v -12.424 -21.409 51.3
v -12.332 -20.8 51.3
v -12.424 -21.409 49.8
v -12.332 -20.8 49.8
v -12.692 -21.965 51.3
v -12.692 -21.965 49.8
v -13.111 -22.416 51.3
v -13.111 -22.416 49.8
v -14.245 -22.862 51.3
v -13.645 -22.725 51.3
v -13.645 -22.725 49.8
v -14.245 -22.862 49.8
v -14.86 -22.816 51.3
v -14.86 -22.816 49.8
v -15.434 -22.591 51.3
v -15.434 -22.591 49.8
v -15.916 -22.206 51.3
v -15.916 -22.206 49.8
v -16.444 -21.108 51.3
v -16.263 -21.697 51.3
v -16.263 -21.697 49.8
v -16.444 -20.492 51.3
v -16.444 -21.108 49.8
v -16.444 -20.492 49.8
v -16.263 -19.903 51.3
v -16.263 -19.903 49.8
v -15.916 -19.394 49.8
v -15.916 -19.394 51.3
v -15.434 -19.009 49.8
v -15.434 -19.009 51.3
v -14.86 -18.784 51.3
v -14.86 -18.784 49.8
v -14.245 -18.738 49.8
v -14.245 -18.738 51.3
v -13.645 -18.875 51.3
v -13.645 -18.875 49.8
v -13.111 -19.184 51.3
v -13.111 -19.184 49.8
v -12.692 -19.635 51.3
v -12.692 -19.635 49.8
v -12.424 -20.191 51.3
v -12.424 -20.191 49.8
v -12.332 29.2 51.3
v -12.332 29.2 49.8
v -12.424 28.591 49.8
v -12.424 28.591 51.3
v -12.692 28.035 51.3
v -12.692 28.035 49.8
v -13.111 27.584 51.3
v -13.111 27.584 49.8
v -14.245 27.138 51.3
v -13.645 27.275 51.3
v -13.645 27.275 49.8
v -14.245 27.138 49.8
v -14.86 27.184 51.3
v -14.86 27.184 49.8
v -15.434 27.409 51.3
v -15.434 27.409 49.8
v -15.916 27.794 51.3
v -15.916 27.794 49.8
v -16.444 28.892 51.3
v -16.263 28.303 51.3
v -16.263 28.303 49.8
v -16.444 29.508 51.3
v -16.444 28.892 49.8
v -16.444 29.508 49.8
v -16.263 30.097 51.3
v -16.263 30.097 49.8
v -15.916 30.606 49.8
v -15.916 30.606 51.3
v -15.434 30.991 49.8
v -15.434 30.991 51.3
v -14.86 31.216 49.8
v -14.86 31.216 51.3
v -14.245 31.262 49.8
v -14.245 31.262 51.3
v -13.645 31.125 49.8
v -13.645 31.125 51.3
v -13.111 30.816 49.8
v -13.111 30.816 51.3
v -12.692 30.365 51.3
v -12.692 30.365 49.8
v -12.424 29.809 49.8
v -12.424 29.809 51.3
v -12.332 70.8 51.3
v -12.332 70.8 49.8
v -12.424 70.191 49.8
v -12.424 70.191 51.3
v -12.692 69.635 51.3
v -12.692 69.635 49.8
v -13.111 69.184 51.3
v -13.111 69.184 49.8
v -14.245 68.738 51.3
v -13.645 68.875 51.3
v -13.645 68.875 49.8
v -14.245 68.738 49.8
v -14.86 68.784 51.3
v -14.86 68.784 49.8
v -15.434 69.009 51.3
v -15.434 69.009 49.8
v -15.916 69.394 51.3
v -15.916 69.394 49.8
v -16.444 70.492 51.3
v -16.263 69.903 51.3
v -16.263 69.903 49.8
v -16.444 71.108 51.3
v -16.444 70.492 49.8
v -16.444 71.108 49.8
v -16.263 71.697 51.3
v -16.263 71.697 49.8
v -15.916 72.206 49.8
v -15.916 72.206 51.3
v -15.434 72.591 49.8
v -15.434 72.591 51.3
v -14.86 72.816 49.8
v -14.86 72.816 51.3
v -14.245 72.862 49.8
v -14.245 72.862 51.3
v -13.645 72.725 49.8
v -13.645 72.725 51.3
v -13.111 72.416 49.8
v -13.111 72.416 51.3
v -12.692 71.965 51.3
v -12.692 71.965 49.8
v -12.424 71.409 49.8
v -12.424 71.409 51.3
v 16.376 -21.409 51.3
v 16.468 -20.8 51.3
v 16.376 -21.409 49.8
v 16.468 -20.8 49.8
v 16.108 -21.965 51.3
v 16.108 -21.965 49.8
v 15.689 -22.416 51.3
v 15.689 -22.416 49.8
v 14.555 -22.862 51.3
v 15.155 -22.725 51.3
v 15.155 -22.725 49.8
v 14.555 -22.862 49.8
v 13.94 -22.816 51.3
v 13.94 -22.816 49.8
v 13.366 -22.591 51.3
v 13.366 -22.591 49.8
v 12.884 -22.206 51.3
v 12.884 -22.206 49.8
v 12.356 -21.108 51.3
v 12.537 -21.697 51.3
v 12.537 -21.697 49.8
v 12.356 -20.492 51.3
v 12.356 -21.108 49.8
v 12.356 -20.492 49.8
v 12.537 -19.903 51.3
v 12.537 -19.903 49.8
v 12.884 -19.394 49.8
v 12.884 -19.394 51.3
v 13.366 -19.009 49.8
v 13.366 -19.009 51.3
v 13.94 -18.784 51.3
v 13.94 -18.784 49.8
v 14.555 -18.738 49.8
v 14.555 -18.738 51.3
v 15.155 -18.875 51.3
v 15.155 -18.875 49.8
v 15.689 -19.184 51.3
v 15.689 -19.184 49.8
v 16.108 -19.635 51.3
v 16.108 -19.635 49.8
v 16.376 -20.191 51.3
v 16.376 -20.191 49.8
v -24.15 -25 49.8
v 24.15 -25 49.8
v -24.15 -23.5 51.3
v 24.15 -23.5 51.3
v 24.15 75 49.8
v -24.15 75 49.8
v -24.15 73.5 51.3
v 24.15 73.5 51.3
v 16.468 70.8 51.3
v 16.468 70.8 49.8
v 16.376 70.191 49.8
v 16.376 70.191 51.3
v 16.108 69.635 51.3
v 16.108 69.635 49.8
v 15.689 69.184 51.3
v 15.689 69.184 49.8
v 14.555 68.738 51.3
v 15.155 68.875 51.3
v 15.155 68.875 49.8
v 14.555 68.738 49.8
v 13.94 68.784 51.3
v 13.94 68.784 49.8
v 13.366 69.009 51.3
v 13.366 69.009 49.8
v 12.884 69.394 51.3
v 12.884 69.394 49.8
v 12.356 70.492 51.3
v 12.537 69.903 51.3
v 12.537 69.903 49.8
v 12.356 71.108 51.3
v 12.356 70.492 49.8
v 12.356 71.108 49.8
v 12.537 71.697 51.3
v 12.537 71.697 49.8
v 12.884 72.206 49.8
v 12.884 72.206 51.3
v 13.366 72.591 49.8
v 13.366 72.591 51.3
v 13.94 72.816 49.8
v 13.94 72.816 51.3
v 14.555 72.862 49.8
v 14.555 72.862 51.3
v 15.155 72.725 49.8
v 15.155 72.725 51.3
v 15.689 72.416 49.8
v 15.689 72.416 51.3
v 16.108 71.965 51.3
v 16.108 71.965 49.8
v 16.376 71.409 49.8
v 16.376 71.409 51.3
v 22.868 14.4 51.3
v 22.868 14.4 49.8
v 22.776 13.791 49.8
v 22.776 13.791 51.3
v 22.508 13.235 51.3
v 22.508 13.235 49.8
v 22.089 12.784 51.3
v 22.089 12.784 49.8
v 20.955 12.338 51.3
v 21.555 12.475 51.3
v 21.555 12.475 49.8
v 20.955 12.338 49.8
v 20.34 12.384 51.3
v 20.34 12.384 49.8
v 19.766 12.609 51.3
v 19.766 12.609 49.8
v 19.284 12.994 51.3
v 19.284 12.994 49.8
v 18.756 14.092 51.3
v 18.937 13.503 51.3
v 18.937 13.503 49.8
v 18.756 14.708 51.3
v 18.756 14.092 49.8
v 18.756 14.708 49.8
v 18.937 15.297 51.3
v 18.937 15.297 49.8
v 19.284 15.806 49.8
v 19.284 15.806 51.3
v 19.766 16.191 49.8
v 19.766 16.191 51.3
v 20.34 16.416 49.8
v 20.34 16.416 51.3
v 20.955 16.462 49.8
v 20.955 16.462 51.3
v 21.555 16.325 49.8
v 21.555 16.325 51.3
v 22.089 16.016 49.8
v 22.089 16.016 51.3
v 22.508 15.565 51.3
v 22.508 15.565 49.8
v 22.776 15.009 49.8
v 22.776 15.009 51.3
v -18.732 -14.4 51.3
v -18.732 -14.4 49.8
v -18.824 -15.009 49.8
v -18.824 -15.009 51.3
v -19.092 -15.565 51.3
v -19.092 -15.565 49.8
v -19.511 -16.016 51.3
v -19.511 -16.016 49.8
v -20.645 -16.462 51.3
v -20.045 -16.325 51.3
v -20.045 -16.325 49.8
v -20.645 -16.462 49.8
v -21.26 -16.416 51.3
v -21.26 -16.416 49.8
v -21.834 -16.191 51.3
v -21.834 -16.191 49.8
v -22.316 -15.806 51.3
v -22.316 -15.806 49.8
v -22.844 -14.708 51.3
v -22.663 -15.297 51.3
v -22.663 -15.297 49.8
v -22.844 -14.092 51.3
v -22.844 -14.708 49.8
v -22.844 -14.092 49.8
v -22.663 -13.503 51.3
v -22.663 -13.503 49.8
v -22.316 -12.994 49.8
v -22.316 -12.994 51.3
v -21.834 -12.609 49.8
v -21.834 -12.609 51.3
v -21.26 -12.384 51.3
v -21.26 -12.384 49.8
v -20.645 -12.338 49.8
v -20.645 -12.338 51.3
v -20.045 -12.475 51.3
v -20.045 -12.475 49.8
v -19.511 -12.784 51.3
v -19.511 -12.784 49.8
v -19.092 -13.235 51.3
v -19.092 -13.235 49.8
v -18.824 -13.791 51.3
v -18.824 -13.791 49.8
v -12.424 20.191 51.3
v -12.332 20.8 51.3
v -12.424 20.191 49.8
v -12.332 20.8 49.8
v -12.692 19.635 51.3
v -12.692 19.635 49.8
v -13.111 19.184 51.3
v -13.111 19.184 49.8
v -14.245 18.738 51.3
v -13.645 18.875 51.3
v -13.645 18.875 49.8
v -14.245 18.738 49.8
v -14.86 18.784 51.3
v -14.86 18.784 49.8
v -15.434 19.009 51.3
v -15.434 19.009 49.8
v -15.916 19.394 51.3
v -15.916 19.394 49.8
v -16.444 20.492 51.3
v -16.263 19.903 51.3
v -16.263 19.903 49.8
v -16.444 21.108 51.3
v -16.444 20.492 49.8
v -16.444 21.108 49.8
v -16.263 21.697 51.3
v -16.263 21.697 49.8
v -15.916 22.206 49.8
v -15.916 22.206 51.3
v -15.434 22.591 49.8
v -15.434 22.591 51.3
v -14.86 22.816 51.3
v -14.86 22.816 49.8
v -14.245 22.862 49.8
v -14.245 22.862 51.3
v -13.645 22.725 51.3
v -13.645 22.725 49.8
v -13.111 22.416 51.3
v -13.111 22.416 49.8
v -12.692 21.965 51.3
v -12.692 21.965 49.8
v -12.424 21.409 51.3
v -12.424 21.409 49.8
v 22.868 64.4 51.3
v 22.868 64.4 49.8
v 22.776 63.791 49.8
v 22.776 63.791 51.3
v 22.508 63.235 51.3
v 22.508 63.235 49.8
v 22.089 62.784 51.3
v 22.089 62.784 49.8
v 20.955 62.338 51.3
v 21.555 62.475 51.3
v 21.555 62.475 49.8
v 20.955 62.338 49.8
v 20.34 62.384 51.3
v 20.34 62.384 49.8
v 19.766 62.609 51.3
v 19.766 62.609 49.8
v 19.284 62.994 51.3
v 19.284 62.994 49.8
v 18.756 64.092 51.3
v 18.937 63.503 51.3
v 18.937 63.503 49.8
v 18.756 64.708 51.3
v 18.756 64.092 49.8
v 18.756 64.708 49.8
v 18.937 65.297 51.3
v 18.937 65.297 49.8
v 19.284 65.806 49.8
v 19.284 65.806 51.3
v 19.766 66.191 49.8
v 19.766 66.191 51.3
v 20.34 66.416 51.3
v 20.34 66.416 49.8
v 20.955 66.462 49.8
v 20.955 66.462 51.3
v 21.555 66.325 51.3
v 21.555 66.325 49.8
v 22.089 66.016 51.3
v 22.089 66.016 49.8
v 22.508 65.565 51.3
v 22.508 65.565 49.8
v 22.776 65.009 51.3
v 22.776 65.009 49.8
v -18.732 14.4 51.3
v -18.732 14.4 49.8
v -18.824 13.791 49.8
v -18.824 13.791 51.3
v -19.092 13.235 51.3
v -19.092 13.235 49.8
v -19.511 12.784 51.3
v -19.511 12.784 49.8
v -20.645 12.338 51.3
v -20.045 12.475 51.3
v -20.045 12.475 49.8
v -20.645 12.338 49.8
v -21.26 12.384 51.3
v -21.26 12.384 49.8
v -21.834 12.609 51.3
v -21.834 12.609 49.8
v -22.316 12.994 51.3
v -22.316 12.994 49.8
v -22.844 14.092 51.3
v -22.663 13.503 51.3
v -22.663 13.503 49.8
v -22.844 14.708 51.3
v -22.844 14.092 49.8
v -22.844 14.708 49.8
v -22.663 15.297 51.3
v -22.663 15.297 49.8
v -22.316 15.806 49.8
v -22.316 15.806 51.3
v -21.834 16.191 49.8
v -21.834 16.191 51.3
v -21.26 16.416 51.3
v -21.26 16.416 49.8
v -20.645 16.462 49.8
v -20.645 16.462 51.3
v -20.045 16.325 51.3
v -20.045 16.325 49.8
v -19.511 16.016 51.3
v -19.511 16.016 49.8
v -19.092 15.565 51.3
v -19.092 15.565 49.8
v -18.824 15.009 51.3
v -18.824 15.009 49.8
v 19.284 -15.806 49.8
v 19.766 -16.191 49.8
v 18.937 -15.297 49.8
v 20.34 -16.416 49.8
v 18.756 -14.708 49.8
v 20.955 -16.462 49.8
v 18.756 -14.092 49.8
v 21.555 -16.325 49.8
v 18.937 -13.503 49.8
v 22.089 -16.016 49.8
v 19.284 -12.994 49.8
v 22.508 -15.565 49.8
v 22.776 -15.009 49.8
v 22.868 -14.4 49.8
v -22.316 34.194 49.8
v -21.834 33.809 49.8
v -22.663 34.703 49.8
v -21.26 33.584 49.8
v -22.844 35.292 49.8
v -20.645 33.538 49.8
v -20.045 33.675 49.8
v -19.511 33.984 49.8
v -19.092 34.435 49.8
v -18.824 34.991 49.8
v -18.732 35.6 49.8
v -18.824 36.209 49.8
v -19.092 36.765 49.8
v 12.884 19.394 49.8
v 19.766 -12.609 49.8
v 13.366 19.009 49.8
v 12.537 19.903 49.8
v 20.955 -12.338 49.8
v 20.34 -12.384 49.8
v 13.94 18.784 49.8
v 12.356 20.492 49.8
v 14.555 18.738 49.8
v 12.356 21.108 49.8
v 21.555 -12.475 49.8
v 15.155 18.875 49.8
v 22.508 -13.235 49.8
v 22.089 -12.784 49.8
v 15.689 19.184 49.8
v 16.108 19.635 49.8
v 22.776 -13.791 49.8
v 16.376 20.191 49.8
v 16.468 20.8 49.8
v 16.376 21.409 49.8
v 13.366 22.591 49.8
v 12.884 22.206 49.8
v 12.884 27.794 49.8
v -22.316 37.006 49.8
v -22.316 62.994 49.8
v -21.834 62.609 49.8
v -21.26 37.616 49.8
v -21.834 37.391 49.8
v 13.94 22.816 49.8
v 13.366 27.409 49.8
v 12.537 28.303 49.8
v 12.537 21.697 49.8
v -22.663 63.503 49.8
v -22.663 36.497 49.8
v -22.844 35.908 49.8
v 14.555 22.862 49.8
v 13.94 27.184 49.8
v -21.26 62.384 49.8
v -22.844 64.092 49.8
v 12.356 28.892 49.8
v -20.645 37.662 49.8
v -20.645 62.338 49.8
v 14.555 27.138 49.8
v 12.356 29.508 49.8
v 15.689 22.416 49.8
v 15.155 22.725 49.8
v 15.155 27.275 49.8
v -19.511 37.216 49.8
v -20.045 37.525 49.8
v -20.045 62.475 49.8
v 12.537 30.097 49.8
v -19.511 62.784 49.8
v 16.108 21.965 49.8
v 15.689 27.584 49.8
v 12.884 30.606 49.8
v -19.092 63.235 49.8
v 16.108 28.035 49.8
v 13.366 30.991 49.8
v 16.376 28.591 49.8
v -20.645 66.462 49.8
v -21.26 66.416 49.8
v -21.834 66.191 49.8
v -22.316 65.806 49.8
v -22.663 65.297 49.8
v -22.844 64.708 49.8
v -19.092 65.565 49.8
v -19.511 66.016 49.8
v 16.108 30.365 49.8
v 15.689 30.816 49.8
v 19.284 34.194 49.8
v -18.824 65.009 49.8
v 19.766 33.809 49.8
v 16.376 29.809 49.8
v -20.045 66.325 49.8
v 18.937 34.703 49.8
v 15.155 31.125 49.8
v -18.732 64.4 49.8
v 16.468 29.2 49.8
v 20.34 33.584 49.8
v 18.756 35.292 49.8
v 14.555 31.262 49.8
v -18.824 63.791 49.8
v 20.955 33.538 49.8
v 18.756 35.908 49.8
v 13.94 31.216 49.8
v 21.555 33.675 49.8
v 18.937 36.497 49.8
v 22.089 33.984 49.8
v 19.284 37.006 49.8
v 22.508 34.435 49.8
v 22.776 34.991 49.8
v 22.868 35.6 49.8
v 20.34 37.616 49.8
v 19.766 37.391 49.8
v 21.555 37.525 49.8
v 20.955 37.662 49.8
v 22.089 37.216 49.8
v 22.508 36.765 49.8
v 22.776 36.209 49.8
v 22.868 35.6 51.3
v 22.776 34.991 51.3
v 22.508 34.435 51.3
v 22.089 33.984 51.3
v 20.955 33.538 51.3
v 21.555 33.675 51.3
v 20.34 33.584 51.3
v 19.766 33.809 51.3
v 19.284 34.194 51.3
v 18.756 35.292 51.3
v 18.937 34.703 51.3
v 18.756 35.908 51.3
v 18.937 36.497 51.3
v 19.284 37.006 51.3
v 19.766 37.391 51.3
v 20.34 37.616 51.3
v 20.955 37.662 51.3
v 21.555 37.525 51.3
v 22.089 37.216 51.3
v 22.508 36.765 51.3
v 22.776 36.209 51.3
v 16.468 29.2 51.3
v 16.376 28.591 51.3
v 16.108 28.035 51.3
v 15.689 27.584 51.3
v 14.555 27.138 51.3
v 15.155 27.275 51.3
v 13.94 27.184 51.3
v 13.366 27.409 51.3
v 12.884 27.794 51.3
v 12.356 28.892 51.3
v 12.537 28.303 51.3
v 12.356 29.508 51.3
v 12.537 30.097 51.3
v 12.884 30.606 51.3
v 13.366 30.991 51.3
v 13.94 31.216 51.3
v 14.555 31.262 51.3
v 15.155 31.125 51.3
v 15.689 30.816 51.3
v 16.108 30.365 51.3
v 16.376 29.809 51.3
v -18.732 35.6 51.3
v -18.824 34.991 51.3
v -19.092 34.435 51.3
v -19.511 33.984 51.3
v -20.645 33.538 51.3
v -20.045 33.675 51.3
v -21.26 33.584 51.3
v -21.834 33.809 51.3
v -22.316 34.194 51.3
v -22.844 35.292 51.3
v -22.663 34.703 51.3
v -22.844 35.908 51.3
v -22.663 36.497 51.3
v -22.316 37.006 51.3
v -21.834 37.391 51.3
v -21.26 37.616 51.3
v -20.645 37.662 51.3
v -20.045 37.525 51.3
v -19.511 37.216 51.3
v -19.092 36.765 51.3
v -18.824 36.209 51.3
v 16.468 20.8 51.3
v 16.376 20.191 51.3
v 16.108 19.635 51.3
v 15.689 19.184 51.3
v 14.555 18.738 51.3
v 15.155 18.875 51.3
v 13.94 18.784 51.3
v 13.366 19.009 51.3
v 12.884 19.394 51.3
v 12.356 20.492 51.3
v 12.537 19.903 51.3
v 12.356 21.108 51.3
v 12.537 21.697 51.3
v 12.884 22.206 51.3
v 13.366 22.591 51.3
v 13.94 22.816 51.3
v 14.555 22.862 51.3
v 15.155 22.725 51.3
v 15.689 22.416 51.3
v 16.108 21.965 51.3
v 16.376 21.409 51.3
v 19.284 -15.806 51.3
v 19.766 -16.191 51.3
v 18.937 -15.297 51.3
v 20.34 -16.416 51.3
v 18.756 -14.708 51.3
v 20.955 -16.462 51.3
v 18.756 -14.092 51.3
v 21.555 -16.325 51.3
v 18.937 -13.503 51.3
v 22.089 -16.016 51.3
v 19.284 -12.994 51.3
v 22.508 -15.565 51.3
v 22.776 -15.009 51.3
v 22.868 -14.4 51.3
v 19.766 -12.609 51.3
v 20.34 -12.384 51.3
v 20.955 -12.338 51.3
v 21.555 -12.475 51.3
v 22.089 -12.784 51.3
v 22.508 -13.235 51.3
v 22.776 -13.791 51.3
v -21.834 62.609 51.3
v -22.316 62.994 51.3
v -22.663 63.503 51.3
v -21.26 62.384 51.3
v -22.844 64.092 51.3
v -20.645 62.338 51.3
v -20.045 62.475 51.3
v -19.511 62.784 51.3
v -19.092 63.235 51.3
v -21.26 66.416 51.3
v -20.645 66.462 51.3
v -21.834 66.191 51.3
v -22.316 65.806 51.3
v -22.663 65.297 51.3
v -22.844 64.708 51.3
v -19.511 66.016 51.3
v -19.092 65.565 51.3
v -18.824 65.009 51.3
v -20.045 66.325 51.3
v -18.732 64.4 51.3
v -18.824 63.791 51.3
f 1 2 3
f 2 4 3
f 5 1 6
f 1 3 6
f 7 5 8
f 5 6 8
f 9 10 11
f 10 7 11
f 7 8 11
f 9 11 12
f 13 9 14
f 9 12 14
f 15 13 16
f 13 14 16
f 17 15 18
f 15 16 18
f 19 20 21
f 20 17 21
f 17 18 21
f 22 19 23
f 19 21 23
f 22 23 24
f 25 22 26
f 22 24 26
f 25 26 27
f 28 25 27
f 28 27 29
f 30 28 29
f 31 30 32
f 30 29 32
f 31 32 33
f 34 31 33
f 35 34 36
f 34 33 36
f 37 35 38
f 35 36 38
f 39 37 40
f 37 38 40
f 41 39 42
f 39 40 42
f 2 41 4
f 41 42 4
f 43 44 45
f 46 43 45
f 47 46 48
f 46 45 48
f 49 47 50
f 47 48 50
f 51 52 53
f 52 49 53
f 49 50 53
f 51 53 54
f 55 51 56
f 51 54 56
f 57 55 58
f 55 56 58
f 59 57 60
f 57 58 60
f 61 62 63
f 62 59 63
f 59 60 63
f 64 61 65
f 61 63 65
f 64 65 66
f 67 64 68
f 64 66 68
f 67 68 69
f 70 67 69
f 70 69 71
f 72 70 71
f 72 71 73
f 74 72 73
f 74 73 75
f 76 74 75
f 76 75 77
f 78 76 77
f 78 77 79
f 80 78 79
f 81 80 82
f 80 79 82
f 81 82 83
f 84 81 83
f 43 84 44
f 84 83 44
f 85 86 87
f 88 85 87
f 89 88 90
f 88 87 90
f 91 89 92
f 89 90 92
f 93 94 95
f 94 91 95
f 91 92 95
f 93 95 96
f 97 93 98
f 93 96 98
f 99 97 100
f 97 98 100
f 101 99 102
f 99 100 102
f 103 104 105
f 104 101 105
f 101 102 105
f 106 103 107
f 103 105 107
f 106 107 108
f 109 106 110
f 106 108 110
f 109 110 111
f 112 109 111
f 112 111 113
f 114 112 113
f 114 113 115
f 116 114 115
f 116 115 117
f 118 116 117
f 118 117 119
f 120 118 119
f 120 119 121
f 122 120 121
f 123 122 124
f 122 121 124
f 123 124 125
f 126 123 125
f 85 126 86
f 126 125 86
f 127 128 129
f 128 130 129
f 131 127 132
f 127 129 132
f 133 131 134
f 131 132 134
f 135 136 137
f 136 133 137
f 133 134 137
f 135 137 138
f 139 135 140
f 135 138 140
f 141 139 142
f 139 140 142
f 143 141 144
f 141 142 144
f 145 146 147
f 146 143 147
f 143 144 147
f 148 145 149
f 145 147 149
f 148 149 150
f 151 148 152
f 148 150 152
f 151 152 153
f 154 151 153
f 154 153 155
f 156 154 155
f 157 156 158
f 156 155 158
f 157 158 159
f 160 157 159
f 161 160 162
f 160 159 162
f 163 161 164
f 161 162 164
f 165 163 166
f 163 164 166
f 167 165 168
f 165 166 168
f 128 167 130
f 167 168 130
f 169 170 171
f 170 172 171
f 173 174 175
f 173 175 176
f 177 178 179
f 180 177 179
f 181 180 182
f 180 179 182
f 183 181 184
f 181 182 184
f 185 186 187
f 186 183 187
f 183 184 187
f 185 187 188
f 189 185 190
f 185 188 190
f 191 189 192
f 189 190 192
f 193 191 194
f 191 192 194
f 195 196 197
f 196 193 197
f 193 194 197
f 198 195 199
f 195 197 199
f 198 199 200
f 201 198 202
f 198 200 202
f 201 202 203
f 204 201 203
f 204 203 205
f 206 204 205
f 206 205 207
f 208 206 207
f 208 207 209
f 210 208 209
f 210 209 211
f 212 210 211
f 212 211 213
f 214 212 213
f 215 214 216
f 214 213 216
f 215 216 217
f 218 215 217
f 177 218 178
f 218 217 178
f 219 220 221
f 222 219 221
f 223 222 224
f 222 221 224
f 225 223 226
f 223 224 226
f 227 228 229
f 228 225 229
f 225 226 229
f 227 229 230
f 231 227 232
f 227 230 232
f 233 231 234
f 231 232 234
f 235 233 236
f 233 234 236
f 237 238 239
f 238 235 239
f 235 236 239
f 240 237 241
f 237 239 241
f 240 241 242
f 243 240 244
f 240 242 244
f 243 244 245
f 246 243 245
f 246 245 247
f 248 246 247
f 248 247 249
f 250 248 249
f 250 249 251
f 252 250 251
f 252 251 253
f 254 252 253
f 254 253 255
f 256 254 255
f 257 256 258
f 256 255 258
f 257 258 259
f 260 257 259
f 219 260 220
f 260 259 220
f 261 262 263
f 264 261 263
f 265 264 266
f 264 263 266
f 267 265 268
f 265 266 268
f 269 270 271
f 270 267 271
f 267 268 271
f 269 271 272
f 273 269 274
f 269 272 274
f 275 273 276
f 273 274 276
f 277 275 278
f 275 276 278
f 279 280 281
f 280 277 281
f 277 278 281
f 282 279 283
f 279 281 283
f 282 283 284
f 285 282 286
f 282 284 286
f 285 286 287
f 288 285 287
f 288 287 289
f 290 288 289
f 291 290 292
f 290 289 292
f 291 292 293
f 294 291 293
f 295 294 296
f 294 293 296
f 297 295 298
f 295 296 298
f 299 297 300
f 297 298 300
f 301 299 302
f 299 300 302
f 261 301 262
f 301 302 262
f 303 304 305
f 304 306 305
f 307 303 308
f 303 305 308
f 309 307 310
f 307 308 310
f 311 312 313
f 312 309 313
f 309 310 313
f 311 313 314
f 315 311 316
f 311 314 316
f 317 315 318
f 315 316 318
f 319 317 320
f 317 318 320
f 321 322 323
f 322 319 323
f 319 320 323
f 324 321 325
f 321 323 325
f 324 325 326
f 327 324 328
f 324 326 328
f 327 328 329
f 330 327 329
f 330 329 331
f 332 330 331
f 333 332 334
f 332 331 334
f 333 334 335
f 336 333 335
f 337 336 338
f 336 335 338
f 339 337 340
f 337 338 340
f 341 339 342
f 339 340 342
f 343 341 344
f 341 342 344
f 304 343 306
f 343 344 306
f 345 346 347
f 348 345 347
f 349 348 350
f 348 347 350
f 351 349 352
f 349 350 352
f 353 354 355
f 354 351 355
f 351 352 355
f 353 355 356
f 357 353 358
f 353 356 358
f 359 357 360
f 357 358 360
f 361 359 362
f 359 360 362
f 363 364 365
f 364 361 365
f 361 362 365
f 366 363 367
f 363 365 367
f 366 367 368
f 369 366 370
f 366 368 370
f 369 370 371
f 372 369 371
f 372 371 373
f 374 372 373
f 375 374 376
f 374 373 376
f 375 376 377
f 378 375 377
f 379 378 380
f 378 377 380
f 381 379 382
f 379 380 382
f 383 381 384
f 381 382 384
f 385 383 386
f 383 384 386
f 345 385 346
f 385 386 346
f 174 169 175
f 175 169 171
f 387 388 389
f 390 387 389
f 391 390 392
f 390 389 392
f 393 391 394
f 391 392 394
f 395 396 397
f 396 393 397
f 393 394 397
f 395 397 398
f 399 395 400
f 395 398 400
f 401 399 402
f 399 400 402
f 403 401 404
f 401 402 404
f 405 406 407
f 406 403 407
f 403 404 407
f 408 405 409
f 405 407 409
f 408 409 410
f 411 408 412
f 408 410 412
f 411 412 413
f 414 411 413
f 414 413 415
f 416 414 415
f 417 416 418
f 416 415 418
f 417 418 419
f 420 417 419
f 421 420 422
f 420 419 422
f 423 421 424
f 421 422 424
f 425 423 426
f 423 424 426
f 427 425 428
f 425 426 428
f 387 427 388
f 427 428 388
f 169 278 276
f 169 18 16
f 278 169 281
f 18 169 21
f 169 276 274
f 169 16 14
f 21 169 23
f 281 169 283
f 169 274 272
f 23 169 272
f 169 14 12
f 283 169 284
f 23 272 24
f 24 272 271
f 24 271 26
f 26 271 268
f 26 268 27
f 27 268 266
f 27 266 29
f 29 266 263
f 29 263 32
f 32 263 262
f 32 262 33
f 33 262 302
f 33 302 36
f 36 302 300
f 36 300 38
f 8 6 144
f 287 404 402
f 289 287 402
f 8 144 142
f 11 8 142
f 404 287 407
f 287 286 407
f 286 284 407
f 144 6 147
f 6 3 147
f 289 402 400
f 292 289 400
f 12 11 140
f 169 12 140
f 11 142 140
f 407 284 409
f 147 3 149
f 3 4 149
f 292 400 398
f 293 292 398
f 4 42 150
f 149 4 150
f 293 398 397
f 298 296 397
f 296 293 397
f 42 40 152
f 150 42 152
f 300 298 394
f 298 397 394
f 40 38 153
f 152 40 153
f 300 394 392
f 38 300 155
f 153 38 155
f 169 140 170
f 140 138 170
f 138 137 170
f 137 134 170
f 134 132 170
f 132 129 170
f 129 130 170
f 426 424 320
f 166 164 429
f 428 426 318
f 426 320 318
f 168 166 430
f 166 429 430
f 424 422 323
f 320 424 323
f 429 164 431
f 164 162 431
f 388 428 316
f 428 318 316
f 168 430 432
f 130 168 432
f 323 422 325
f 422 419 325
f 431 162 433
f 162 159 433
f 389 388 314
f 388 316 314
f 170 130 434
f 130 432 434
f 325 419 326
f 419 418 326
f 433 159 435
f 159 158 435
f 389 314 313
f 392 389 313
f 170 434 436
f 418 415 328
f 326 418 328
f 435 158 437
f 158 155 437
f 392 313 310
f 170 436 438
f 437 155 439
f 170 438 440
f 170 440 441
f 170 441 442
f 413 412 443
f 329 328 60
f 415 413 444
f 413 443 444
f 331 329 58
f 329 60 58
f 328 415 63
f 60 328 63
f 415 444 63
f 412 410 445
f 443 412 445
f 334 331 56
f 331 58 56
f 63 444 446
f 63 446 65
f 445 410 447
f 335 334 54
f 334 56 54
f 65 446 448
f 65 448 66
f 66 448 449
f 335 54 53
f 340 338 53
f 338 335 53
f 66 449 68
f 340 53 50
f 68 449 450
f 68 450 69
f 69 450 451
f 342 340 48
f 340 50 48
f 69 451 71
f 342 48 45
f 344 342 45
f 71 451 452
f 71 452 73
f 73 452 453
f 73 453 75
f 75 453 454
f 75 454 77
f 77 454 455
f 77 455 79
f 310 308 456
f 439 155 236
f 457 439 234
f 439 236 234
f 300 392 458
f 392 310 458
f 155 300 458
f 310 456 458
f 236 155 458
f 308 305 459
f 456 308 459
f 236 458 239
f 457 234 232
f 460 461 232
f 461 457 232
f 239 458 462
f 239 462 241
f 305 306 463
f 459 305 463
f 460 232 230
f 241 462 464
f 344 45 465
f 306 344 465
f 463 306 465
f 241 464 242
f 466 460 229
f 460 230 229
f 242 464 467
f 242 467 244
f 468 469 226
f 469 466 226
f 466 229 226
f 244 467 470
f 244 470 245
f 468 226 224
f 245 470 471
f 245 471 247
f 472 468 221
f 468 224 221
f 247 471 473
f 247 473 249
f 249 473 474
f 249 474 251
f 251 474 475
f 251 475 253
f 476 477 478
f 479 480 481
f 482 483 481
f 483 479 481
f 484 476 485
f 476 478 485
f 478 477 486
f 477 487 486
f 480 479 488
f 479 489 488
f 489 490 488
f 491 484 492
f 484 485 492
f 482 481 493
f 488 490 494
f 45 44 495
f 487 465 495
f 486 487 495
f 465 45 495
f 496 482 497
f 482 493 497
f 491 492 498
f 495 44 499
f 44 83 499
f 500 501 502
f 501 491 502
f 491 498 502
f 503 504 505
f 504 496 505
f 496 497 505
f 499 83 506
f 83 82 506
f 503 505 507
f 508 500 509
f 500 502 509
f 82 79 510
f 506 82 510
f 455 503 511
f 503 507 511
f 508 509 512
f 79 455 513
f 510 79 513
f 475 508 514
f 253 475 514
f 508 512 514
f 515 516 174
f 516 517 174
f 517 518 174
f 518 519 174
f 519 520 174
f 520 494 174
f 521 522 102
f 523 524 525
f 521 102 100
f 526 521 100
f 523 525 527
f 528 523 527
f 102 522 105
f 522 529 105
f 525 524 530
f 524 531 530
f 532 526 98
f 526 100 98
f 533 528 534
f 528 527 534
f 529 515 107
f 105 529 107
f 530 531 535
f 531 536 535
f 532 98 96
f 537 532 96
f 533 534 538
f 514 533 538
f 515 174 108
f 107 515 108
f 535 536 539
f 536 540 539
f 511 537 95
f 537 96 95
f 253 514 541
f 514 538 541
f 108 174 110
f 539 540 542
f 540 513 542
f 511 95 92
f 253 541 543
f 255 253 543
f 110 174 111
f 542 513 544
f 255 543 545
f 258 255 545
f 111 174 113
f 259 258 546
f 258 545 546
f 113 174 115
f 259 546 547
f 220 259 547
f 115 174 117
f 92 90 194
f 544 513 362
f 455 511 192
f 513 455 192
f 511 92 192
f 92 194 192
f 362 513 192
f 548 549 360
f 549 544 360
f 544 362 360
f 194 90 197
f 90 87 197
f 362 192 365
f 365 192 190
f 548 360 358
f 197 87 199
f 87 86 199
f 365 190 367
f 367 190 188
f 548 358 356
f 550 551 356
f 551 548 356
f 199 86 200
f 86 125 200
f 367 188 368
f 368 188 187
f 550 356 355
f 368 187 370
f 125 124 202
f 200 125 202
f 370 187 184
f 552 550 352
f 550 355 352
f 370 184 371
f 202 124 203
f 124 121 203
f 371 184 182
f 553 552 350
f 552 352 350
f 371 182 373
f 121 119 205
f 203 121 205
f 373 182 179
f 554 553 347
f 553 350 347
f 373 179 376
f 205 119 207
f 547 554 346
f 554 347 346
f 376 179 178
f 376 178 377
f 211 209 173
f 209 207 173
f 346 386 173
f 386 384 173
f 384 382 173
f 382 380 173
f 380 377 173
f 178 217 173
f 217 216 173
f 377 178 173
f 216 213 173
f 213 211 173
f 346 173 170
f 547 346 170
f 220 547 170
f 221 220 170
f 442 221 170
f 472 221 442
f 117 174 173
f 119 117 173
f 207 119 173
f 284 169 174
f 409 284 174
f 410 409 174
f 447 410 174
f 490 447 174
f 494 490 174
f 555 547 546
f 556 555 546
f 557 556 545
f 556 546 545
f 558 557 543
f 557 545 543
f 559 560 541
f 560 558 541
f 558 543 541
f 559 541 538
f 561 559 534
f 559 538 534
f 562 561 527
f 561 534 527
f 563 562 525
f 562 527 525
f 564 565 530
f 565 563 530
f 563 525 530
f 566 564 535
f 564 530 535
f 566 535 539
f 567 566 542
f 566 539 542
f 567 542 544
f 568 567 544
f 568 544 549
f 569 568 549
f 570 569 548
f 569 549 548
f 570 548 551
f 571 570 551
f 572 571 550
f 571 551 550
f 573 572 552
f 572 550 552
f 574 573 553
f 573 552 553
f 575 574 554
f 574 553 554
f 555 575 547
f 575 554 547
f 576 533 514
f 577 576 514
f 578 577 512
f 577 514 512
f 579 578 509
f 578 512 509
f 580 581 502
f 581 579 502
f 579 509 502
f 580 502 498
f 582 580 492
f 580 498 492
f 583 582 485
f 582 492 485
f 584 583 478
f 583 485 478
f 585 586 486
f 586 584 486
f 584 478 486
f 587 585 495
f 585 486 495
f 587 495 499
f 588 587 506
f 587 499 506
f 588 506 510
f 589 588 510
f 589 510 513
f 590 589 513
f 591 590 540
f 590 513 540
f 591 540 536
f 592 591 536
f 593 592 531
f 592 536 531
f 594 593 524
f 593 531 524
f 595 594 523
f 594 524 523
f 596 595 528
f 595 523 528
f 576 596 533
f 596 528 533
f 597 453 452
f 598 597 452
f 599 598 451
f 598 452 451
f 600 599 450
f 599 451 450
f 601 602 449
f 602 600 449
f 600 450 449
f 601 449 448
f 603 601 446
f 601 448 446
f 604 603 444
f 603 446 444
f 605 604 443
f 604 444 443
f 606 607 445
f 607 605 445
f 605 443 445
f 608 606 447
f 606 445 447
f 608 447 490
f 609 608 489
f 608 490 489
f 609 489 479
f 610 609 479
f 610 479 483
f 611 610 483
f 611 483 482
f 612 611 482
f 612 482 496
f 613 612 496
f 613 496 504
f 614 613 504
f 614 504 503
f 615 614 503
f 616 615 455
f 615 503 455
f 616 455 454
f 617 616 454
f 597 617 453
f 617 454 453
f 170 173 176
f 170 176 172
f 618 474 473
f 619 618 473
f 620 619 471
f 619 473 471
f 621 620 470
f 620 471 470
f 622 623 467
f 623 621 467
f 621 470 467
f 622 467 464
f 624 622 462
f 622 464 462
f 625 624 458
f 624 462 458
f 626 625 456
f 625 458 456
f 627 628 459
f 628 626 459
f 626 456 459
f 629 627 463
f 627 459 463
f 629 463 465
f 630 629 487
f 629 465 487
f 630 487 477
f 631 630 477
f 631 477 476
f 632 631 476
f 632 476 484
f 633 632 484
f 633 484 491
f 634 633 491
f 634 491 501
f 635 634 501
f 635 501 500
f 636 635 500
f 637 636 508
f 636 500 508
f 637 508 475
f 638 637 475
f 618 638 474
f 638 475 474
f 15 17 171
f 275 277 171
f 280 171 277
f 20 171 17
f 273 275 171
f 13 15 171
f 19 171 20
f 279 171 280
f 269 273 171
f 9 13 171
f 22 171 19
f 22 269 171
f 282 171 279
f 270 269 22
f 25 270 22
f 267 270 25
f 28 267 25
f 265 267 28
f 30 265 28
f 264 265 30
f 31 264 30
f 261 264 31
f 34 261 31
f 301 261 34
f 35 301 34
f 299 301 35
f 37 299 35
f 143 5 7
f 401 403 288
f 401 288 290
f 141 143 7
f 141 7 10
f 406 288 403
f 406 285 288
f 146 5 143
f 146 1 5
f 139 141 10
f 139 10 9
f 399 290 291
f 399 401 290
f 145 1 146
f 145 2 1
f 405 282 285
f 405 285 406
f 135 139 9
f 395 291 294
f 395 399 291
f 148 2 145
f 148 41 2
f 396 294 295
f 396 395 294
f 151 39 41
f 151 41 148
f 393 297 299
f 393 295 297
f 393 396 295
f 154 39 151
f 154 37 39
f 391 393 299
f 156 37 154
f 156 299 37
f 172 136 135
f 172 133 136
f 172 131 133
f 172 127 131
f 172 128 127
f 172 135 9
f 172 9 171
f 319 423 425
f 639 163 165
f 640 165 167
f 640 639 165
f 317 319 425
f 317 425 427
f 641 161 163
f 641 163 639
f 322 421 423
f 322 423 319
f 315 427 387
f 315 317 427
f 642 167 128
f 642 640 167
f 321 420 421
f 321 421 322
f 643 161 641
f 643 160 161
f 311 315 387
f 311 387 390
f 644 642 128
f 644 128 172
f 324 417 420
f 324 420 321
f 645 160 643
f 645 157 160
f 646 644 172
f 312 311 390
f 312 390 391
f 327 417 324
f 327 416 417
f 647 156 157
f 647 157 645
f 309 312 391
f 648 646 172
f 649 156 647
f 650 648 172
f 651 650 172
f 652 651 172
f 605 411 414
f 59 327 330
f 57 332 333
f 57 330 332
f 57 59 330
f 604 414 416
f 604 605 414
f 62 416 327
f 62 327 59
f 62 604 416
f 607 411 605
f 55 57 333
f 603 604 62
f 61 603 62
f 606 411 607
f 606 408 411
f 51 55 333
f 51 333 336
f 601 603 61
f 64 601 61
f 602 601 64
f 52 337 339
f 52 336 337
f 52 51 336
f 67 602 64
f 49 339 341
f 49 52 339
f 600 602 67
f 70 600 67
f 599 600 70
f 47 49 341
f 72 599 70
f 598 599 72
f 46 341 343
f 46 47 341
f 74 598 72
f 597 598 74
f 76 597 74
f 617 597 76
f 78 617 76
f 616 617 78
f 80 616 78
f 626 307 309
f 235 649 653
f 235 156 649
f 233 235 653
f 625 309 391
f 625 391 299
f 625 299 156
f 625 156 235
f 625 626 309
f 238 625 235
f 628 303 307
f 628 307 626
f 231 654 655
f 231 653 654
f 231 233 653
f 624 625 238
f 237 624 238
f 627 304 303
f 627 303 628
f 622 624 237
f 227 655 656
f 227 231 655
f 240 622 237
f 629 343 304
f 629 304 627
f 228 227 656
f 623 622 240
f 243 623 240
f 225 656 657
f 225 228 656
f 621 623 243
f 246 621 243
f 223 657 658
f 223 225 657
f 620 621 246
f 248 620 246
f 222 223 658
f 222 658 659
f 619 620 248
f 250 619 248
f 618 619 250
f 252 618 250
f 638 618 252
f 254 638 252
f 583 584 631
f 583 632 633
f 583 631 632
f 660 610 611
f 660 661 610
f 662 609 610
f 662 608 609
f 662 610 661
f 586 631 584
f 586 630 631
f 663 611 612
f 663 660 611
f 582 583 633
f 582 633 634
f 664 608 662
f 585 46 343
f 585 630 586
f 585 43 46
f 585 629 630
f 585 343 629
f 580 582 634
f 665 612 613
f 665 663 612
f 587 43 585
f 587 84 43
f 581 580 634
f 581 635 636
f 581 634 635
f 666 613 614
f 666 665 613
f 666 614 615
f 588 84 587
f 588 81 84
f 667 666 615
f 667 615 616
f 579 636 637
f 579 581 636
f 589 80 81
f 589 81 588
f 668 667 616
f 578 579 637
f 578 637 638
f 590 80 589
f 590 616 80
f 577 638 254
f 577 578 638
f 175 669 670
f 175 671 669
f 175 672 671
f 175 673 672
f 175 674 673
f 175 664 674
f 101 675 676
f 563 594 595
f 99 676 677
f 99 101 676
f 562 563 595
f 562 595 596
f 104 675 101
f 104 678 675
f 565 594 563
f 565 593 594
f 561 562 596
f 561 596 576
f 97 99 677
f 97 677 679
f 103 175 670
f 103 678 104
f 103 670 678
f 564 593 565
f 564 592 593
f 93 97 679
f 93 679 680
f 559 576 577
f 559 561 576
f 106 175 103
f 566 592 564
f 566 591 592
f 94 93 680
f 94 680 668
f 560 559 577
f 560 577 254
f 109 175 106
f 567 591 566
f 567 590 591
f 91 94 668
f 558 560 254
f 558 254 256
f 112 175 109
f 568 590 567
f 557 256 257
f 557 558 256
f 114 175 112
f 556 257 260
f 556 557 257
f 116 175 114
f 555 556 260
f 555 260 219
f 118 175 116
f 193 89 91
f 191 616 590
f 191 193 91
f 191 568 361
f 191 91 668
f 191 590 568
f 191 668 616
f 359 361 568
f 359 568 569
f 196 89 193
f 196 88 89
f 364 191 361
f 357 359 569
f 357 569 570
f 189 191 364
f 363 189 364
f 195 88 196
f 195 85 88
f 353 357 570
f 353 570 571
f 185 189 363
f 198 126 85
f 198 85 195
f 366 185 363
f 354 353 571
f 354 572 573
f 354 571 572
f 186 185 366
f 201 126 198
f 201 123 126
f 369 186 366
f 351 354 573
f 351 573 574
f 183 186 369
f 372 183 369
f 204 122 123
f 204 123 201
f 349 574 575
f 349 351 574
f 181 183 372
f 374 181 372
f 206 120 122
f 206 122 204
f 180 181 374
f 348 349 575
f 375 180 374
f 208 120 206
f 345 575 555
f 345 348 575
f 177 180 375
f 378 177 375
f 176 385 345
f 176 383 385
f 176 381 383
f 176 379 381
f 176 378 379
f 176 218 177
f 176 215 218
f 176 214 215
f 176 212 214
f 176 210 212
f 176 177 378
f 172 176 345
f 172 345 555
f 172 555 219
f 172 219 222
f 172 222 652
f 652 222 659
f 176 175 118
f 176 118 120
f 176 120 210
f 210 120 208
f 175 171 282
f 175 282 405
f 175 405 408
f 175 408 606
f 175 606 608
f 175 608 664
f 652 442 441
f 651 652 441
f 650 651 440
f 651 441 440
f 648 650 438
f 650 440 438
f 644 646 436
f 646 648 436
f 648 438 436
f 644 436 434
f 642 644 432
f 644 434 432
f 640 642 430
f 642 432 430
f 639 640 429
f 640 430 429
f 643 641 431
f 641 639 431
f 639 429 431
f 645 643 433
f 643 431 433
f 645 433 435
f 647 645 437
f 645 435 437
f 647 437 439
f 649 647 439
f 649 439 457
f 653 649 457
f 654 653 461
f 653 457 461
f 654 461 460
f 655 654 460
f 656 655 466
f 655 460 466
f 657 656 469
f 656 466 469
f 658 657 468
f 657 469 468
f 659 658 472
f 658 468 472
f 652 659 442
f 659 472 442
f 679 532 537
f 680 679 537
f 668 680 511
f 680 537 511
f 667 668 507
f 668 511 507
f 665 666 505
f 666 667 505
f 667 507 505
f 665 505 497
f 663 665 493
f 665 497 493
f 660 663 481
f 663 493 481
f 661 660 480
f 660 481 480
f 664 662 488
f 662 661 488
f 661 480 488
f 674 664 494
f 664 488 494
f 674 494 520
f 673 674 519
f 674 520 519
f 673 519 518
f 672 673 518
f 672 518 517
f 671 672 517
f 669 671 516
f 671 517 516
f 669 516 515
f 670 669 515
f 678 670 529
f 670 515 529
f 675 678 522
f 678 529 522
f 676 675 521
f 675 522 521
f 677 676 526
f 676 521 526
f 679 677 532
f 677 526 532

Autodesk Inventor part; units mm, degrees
ref_plane "YZ Plane" through (0, 0, 0) normal (1, 0, 0) x (0, 1, 0)
ref_plane "XZ Plane" through (0, 0, 0) normal (0, 1, 0) x (-1, 0, 0)
sketch "Sketch1" plane through (0, 0, 0) normal (0, 0, 1) x (1, 0, 0)
  circle A0 centre (-21.9, -21.9) radius 1.875 projected
  circle A1 centre (21.9, 21.9) radius 1.875 projected
  circle A2 centre (21.9, -21.9) radius 1.875 projected
  circle A3 centre (-21.9, 21.9) radius 1.875 projected
  circle A4 centre (14.4, 20.8) radius 2.0675 projected
  circle A5 centre (-14.4, -20.8) radius 2.0675 projected
  circle A6 centre (14.4, -20.8) radius 2.0675 projected
  circle A7 centre (20.8, -14.4) radius 2.0675 projected
  line L0 (-17.05, 17.05) -> (-17.05, -17.05) projected
  line L1 (17.05, 17.05) -> (-17.05, 17.05) projected
  line L2 (17.05, -17.05) -> (17.05, 17.05) projected
  line L3 (-17.05, -17.05) -> (17.05, -17.05) projected
  circle A8 centre (20.8, 14.4) radius 2.0675 projected
  circle A9 centre (-14.4, 20.8) radius 2.0675 projected
  circle A10 centre (-20.8, -14.4) radius 2.0675 projected
  circle A11 centre (-20.8, 14.4) radius 2.0675 projected
  line L4 (-22.9, 24.15) -> (22.9, 24.15) projected
  arc A12 (-22.9, 24.15) -> (-24.15, 22.9) centre (-22.9, 22.9) ccw projected
  line L5 (-24.15, -22.9) -> (-24.15, 22.9) projected
  arc A13 (-24.15, -22.9) -> (-22.9, -24.15) centre (-22.9, -22.9) ccw projected
  line L6 (22.9, -24.15) -> (-22.9, -24.15) projected
  arc A14 (22.9, -24.15) -> (24.15, -22.9) centre (22.9, -22.9) ccw projected
  line L7 (24.15, 22.9) -> (24.15, -22.9) projected
  arc A15 (24.15, 22.9) -> (22.9, 24.15) centre (22.9, 22.9) ccw projected
  point P0 (0, 0)
ref_plane "Work Plane1" through (-24.15, -24.15, 49.8) normal (0, 0, 1) x (1, 0, 0)
extrude "Extrusion1" add sketch "Sketch1" along normal blind 1.5 from surface at 49.8 contours A0 | A1 | A2 | A3 | L1 L2 L3 L0 | L4 A15 L7 A14 L6 A13 L5 A12
sketch "Sketch2" plane through (-22.9, -24.15, 51.3) normal (0, 0, 1) x (1, 0, 0)
  arc A0 (-1.25, 1.25) -> (0, 0) centre (0, 1.25) ccw projected
  line L0 (45.8, 0) -> (0, 0) projected
  arc A1 (45.8, 0) -> (47.05, 1.25) centre (45.8, 1.25) ccw projected
  line L1 (47.05, 47.05) -> (47.05, 1.25) projected
  arc A2 (47.05, 47.05) -> (45.8, 48.3) centre (45.8, 47.05) ccw projected
  line L2 (0, 48.3) -> (45.8, 48.3) projected
  arc A3 (0, 48.3) -> (-1.25, 47.05) centre (0, 47.05) ccw projected
  line L3 (-1.25, 1.25) -> (-1.25, 47.05) projected
  circle A4 centre (2.1, 38.55) radius 2.0675 projected
  circle A5 centre (2.1, 9.75) radius 2.0675 projected
  circle A6 centre (8.5, 44.95) radius 2.0675 projected
  circle A7 centre (43.7, 38.55) radius 2.0675 projected
  circle A8 centre (43.7, 9.75) radius 2.0675 projected
  circle A9 centre (37.3, 3.35) radius 2.0675 projected
  circle A10 centre (8.5, 3.35) radius 2.0675 projected
  circle A11 centre (37.3, 44.95) radius 2.0675 projected
  arc A12 (47.9, 47.05) -> (45.8, 49.15) centre (45.8, 47.05) ccw
  line L4 (47.9, 47.05) -> (47.9, 1.25)
  arc A13 (45.8, -0.85) -> (47.9, 1.25) centre (45.8, 1.25) ccw
  line L5 (45.8, -0.85) -> (0, -0.85)
  arc A14 (-2.1, 1.25) -> (0, -0.85) centre (0, 1.25) ccw
  line L6 (-2.1, 1.25) -> (-2.1, 47.05)
  arc A15 (0, 49.15) -> (-2.1, 47.05) centre (0, 47.05) ccw
  line L7 (0, 49.15) -> (45.8, 49.15)
  line L8 (47.05, 1.25) -> (45.8, 1.25)
  line L9 (45.8, 1.25) -> (45.8, -0.85)
  line L10 (45.8, -0.85) -> (47.05, -0.85)
  line L11 (47.05, -0.85) -> (47.05, 1.25)
  line L12 (-1.25, 1.25) -> (0, 1.25)
  line L13 (0, 1.25) -> (0, -0.85)
  line L14 (0, -0.85) -> (-1.25, -0.85)
  line L15 (-1.25, -0.85) -> (-1.25, 1.25)
  line L16 (-1.25, 47.05) -> (0, 47.05)
  line L17 (0, 47.05) -> (0, 49.15)
  line L18 (0, 49.15) -> (-1.25, 49.15)
  line L19 (-1.25, 49.15) -> (-1.25, 47.05)
  line L20 (47.05, 47.05) -> (45.8, 47.05)
  line L21 (45.8, 47.05) -> (45.8, 49.15)
  line L22 (45.8, 49.15) -> (47.05, 49.15)
  line L23 (47.05, 49.15) -> (47.05, 47.05)
  point P0 (22.9, 24.15)
  dimension "d2" = 0.85
extrude "Extrusion2" add sketch "Sketch2" against normal blind 1.5 contours A0 L13 A14 L15 | L0 L9 L5 L13 | L19 A15 L17 A3 | A14 L14 L15 | A1 L11 A13 L9 | L17 L7 L21 L2 | L19 L18 A15 | A13 L11 L10 | L21 A12 L23 A2 | L22 L23 A12
pattern_linear "Rectangular Pattern1" count 2 spacing 50 along (0, 1, 0) of "Extrusion1", "Extrusion2"
chamfer "Chamfer1" distance 1.5 angle 45 2 edges at (0, -25, 51.3) (0, 75, 51.3)
properties part number "Panel Top 1x2"
